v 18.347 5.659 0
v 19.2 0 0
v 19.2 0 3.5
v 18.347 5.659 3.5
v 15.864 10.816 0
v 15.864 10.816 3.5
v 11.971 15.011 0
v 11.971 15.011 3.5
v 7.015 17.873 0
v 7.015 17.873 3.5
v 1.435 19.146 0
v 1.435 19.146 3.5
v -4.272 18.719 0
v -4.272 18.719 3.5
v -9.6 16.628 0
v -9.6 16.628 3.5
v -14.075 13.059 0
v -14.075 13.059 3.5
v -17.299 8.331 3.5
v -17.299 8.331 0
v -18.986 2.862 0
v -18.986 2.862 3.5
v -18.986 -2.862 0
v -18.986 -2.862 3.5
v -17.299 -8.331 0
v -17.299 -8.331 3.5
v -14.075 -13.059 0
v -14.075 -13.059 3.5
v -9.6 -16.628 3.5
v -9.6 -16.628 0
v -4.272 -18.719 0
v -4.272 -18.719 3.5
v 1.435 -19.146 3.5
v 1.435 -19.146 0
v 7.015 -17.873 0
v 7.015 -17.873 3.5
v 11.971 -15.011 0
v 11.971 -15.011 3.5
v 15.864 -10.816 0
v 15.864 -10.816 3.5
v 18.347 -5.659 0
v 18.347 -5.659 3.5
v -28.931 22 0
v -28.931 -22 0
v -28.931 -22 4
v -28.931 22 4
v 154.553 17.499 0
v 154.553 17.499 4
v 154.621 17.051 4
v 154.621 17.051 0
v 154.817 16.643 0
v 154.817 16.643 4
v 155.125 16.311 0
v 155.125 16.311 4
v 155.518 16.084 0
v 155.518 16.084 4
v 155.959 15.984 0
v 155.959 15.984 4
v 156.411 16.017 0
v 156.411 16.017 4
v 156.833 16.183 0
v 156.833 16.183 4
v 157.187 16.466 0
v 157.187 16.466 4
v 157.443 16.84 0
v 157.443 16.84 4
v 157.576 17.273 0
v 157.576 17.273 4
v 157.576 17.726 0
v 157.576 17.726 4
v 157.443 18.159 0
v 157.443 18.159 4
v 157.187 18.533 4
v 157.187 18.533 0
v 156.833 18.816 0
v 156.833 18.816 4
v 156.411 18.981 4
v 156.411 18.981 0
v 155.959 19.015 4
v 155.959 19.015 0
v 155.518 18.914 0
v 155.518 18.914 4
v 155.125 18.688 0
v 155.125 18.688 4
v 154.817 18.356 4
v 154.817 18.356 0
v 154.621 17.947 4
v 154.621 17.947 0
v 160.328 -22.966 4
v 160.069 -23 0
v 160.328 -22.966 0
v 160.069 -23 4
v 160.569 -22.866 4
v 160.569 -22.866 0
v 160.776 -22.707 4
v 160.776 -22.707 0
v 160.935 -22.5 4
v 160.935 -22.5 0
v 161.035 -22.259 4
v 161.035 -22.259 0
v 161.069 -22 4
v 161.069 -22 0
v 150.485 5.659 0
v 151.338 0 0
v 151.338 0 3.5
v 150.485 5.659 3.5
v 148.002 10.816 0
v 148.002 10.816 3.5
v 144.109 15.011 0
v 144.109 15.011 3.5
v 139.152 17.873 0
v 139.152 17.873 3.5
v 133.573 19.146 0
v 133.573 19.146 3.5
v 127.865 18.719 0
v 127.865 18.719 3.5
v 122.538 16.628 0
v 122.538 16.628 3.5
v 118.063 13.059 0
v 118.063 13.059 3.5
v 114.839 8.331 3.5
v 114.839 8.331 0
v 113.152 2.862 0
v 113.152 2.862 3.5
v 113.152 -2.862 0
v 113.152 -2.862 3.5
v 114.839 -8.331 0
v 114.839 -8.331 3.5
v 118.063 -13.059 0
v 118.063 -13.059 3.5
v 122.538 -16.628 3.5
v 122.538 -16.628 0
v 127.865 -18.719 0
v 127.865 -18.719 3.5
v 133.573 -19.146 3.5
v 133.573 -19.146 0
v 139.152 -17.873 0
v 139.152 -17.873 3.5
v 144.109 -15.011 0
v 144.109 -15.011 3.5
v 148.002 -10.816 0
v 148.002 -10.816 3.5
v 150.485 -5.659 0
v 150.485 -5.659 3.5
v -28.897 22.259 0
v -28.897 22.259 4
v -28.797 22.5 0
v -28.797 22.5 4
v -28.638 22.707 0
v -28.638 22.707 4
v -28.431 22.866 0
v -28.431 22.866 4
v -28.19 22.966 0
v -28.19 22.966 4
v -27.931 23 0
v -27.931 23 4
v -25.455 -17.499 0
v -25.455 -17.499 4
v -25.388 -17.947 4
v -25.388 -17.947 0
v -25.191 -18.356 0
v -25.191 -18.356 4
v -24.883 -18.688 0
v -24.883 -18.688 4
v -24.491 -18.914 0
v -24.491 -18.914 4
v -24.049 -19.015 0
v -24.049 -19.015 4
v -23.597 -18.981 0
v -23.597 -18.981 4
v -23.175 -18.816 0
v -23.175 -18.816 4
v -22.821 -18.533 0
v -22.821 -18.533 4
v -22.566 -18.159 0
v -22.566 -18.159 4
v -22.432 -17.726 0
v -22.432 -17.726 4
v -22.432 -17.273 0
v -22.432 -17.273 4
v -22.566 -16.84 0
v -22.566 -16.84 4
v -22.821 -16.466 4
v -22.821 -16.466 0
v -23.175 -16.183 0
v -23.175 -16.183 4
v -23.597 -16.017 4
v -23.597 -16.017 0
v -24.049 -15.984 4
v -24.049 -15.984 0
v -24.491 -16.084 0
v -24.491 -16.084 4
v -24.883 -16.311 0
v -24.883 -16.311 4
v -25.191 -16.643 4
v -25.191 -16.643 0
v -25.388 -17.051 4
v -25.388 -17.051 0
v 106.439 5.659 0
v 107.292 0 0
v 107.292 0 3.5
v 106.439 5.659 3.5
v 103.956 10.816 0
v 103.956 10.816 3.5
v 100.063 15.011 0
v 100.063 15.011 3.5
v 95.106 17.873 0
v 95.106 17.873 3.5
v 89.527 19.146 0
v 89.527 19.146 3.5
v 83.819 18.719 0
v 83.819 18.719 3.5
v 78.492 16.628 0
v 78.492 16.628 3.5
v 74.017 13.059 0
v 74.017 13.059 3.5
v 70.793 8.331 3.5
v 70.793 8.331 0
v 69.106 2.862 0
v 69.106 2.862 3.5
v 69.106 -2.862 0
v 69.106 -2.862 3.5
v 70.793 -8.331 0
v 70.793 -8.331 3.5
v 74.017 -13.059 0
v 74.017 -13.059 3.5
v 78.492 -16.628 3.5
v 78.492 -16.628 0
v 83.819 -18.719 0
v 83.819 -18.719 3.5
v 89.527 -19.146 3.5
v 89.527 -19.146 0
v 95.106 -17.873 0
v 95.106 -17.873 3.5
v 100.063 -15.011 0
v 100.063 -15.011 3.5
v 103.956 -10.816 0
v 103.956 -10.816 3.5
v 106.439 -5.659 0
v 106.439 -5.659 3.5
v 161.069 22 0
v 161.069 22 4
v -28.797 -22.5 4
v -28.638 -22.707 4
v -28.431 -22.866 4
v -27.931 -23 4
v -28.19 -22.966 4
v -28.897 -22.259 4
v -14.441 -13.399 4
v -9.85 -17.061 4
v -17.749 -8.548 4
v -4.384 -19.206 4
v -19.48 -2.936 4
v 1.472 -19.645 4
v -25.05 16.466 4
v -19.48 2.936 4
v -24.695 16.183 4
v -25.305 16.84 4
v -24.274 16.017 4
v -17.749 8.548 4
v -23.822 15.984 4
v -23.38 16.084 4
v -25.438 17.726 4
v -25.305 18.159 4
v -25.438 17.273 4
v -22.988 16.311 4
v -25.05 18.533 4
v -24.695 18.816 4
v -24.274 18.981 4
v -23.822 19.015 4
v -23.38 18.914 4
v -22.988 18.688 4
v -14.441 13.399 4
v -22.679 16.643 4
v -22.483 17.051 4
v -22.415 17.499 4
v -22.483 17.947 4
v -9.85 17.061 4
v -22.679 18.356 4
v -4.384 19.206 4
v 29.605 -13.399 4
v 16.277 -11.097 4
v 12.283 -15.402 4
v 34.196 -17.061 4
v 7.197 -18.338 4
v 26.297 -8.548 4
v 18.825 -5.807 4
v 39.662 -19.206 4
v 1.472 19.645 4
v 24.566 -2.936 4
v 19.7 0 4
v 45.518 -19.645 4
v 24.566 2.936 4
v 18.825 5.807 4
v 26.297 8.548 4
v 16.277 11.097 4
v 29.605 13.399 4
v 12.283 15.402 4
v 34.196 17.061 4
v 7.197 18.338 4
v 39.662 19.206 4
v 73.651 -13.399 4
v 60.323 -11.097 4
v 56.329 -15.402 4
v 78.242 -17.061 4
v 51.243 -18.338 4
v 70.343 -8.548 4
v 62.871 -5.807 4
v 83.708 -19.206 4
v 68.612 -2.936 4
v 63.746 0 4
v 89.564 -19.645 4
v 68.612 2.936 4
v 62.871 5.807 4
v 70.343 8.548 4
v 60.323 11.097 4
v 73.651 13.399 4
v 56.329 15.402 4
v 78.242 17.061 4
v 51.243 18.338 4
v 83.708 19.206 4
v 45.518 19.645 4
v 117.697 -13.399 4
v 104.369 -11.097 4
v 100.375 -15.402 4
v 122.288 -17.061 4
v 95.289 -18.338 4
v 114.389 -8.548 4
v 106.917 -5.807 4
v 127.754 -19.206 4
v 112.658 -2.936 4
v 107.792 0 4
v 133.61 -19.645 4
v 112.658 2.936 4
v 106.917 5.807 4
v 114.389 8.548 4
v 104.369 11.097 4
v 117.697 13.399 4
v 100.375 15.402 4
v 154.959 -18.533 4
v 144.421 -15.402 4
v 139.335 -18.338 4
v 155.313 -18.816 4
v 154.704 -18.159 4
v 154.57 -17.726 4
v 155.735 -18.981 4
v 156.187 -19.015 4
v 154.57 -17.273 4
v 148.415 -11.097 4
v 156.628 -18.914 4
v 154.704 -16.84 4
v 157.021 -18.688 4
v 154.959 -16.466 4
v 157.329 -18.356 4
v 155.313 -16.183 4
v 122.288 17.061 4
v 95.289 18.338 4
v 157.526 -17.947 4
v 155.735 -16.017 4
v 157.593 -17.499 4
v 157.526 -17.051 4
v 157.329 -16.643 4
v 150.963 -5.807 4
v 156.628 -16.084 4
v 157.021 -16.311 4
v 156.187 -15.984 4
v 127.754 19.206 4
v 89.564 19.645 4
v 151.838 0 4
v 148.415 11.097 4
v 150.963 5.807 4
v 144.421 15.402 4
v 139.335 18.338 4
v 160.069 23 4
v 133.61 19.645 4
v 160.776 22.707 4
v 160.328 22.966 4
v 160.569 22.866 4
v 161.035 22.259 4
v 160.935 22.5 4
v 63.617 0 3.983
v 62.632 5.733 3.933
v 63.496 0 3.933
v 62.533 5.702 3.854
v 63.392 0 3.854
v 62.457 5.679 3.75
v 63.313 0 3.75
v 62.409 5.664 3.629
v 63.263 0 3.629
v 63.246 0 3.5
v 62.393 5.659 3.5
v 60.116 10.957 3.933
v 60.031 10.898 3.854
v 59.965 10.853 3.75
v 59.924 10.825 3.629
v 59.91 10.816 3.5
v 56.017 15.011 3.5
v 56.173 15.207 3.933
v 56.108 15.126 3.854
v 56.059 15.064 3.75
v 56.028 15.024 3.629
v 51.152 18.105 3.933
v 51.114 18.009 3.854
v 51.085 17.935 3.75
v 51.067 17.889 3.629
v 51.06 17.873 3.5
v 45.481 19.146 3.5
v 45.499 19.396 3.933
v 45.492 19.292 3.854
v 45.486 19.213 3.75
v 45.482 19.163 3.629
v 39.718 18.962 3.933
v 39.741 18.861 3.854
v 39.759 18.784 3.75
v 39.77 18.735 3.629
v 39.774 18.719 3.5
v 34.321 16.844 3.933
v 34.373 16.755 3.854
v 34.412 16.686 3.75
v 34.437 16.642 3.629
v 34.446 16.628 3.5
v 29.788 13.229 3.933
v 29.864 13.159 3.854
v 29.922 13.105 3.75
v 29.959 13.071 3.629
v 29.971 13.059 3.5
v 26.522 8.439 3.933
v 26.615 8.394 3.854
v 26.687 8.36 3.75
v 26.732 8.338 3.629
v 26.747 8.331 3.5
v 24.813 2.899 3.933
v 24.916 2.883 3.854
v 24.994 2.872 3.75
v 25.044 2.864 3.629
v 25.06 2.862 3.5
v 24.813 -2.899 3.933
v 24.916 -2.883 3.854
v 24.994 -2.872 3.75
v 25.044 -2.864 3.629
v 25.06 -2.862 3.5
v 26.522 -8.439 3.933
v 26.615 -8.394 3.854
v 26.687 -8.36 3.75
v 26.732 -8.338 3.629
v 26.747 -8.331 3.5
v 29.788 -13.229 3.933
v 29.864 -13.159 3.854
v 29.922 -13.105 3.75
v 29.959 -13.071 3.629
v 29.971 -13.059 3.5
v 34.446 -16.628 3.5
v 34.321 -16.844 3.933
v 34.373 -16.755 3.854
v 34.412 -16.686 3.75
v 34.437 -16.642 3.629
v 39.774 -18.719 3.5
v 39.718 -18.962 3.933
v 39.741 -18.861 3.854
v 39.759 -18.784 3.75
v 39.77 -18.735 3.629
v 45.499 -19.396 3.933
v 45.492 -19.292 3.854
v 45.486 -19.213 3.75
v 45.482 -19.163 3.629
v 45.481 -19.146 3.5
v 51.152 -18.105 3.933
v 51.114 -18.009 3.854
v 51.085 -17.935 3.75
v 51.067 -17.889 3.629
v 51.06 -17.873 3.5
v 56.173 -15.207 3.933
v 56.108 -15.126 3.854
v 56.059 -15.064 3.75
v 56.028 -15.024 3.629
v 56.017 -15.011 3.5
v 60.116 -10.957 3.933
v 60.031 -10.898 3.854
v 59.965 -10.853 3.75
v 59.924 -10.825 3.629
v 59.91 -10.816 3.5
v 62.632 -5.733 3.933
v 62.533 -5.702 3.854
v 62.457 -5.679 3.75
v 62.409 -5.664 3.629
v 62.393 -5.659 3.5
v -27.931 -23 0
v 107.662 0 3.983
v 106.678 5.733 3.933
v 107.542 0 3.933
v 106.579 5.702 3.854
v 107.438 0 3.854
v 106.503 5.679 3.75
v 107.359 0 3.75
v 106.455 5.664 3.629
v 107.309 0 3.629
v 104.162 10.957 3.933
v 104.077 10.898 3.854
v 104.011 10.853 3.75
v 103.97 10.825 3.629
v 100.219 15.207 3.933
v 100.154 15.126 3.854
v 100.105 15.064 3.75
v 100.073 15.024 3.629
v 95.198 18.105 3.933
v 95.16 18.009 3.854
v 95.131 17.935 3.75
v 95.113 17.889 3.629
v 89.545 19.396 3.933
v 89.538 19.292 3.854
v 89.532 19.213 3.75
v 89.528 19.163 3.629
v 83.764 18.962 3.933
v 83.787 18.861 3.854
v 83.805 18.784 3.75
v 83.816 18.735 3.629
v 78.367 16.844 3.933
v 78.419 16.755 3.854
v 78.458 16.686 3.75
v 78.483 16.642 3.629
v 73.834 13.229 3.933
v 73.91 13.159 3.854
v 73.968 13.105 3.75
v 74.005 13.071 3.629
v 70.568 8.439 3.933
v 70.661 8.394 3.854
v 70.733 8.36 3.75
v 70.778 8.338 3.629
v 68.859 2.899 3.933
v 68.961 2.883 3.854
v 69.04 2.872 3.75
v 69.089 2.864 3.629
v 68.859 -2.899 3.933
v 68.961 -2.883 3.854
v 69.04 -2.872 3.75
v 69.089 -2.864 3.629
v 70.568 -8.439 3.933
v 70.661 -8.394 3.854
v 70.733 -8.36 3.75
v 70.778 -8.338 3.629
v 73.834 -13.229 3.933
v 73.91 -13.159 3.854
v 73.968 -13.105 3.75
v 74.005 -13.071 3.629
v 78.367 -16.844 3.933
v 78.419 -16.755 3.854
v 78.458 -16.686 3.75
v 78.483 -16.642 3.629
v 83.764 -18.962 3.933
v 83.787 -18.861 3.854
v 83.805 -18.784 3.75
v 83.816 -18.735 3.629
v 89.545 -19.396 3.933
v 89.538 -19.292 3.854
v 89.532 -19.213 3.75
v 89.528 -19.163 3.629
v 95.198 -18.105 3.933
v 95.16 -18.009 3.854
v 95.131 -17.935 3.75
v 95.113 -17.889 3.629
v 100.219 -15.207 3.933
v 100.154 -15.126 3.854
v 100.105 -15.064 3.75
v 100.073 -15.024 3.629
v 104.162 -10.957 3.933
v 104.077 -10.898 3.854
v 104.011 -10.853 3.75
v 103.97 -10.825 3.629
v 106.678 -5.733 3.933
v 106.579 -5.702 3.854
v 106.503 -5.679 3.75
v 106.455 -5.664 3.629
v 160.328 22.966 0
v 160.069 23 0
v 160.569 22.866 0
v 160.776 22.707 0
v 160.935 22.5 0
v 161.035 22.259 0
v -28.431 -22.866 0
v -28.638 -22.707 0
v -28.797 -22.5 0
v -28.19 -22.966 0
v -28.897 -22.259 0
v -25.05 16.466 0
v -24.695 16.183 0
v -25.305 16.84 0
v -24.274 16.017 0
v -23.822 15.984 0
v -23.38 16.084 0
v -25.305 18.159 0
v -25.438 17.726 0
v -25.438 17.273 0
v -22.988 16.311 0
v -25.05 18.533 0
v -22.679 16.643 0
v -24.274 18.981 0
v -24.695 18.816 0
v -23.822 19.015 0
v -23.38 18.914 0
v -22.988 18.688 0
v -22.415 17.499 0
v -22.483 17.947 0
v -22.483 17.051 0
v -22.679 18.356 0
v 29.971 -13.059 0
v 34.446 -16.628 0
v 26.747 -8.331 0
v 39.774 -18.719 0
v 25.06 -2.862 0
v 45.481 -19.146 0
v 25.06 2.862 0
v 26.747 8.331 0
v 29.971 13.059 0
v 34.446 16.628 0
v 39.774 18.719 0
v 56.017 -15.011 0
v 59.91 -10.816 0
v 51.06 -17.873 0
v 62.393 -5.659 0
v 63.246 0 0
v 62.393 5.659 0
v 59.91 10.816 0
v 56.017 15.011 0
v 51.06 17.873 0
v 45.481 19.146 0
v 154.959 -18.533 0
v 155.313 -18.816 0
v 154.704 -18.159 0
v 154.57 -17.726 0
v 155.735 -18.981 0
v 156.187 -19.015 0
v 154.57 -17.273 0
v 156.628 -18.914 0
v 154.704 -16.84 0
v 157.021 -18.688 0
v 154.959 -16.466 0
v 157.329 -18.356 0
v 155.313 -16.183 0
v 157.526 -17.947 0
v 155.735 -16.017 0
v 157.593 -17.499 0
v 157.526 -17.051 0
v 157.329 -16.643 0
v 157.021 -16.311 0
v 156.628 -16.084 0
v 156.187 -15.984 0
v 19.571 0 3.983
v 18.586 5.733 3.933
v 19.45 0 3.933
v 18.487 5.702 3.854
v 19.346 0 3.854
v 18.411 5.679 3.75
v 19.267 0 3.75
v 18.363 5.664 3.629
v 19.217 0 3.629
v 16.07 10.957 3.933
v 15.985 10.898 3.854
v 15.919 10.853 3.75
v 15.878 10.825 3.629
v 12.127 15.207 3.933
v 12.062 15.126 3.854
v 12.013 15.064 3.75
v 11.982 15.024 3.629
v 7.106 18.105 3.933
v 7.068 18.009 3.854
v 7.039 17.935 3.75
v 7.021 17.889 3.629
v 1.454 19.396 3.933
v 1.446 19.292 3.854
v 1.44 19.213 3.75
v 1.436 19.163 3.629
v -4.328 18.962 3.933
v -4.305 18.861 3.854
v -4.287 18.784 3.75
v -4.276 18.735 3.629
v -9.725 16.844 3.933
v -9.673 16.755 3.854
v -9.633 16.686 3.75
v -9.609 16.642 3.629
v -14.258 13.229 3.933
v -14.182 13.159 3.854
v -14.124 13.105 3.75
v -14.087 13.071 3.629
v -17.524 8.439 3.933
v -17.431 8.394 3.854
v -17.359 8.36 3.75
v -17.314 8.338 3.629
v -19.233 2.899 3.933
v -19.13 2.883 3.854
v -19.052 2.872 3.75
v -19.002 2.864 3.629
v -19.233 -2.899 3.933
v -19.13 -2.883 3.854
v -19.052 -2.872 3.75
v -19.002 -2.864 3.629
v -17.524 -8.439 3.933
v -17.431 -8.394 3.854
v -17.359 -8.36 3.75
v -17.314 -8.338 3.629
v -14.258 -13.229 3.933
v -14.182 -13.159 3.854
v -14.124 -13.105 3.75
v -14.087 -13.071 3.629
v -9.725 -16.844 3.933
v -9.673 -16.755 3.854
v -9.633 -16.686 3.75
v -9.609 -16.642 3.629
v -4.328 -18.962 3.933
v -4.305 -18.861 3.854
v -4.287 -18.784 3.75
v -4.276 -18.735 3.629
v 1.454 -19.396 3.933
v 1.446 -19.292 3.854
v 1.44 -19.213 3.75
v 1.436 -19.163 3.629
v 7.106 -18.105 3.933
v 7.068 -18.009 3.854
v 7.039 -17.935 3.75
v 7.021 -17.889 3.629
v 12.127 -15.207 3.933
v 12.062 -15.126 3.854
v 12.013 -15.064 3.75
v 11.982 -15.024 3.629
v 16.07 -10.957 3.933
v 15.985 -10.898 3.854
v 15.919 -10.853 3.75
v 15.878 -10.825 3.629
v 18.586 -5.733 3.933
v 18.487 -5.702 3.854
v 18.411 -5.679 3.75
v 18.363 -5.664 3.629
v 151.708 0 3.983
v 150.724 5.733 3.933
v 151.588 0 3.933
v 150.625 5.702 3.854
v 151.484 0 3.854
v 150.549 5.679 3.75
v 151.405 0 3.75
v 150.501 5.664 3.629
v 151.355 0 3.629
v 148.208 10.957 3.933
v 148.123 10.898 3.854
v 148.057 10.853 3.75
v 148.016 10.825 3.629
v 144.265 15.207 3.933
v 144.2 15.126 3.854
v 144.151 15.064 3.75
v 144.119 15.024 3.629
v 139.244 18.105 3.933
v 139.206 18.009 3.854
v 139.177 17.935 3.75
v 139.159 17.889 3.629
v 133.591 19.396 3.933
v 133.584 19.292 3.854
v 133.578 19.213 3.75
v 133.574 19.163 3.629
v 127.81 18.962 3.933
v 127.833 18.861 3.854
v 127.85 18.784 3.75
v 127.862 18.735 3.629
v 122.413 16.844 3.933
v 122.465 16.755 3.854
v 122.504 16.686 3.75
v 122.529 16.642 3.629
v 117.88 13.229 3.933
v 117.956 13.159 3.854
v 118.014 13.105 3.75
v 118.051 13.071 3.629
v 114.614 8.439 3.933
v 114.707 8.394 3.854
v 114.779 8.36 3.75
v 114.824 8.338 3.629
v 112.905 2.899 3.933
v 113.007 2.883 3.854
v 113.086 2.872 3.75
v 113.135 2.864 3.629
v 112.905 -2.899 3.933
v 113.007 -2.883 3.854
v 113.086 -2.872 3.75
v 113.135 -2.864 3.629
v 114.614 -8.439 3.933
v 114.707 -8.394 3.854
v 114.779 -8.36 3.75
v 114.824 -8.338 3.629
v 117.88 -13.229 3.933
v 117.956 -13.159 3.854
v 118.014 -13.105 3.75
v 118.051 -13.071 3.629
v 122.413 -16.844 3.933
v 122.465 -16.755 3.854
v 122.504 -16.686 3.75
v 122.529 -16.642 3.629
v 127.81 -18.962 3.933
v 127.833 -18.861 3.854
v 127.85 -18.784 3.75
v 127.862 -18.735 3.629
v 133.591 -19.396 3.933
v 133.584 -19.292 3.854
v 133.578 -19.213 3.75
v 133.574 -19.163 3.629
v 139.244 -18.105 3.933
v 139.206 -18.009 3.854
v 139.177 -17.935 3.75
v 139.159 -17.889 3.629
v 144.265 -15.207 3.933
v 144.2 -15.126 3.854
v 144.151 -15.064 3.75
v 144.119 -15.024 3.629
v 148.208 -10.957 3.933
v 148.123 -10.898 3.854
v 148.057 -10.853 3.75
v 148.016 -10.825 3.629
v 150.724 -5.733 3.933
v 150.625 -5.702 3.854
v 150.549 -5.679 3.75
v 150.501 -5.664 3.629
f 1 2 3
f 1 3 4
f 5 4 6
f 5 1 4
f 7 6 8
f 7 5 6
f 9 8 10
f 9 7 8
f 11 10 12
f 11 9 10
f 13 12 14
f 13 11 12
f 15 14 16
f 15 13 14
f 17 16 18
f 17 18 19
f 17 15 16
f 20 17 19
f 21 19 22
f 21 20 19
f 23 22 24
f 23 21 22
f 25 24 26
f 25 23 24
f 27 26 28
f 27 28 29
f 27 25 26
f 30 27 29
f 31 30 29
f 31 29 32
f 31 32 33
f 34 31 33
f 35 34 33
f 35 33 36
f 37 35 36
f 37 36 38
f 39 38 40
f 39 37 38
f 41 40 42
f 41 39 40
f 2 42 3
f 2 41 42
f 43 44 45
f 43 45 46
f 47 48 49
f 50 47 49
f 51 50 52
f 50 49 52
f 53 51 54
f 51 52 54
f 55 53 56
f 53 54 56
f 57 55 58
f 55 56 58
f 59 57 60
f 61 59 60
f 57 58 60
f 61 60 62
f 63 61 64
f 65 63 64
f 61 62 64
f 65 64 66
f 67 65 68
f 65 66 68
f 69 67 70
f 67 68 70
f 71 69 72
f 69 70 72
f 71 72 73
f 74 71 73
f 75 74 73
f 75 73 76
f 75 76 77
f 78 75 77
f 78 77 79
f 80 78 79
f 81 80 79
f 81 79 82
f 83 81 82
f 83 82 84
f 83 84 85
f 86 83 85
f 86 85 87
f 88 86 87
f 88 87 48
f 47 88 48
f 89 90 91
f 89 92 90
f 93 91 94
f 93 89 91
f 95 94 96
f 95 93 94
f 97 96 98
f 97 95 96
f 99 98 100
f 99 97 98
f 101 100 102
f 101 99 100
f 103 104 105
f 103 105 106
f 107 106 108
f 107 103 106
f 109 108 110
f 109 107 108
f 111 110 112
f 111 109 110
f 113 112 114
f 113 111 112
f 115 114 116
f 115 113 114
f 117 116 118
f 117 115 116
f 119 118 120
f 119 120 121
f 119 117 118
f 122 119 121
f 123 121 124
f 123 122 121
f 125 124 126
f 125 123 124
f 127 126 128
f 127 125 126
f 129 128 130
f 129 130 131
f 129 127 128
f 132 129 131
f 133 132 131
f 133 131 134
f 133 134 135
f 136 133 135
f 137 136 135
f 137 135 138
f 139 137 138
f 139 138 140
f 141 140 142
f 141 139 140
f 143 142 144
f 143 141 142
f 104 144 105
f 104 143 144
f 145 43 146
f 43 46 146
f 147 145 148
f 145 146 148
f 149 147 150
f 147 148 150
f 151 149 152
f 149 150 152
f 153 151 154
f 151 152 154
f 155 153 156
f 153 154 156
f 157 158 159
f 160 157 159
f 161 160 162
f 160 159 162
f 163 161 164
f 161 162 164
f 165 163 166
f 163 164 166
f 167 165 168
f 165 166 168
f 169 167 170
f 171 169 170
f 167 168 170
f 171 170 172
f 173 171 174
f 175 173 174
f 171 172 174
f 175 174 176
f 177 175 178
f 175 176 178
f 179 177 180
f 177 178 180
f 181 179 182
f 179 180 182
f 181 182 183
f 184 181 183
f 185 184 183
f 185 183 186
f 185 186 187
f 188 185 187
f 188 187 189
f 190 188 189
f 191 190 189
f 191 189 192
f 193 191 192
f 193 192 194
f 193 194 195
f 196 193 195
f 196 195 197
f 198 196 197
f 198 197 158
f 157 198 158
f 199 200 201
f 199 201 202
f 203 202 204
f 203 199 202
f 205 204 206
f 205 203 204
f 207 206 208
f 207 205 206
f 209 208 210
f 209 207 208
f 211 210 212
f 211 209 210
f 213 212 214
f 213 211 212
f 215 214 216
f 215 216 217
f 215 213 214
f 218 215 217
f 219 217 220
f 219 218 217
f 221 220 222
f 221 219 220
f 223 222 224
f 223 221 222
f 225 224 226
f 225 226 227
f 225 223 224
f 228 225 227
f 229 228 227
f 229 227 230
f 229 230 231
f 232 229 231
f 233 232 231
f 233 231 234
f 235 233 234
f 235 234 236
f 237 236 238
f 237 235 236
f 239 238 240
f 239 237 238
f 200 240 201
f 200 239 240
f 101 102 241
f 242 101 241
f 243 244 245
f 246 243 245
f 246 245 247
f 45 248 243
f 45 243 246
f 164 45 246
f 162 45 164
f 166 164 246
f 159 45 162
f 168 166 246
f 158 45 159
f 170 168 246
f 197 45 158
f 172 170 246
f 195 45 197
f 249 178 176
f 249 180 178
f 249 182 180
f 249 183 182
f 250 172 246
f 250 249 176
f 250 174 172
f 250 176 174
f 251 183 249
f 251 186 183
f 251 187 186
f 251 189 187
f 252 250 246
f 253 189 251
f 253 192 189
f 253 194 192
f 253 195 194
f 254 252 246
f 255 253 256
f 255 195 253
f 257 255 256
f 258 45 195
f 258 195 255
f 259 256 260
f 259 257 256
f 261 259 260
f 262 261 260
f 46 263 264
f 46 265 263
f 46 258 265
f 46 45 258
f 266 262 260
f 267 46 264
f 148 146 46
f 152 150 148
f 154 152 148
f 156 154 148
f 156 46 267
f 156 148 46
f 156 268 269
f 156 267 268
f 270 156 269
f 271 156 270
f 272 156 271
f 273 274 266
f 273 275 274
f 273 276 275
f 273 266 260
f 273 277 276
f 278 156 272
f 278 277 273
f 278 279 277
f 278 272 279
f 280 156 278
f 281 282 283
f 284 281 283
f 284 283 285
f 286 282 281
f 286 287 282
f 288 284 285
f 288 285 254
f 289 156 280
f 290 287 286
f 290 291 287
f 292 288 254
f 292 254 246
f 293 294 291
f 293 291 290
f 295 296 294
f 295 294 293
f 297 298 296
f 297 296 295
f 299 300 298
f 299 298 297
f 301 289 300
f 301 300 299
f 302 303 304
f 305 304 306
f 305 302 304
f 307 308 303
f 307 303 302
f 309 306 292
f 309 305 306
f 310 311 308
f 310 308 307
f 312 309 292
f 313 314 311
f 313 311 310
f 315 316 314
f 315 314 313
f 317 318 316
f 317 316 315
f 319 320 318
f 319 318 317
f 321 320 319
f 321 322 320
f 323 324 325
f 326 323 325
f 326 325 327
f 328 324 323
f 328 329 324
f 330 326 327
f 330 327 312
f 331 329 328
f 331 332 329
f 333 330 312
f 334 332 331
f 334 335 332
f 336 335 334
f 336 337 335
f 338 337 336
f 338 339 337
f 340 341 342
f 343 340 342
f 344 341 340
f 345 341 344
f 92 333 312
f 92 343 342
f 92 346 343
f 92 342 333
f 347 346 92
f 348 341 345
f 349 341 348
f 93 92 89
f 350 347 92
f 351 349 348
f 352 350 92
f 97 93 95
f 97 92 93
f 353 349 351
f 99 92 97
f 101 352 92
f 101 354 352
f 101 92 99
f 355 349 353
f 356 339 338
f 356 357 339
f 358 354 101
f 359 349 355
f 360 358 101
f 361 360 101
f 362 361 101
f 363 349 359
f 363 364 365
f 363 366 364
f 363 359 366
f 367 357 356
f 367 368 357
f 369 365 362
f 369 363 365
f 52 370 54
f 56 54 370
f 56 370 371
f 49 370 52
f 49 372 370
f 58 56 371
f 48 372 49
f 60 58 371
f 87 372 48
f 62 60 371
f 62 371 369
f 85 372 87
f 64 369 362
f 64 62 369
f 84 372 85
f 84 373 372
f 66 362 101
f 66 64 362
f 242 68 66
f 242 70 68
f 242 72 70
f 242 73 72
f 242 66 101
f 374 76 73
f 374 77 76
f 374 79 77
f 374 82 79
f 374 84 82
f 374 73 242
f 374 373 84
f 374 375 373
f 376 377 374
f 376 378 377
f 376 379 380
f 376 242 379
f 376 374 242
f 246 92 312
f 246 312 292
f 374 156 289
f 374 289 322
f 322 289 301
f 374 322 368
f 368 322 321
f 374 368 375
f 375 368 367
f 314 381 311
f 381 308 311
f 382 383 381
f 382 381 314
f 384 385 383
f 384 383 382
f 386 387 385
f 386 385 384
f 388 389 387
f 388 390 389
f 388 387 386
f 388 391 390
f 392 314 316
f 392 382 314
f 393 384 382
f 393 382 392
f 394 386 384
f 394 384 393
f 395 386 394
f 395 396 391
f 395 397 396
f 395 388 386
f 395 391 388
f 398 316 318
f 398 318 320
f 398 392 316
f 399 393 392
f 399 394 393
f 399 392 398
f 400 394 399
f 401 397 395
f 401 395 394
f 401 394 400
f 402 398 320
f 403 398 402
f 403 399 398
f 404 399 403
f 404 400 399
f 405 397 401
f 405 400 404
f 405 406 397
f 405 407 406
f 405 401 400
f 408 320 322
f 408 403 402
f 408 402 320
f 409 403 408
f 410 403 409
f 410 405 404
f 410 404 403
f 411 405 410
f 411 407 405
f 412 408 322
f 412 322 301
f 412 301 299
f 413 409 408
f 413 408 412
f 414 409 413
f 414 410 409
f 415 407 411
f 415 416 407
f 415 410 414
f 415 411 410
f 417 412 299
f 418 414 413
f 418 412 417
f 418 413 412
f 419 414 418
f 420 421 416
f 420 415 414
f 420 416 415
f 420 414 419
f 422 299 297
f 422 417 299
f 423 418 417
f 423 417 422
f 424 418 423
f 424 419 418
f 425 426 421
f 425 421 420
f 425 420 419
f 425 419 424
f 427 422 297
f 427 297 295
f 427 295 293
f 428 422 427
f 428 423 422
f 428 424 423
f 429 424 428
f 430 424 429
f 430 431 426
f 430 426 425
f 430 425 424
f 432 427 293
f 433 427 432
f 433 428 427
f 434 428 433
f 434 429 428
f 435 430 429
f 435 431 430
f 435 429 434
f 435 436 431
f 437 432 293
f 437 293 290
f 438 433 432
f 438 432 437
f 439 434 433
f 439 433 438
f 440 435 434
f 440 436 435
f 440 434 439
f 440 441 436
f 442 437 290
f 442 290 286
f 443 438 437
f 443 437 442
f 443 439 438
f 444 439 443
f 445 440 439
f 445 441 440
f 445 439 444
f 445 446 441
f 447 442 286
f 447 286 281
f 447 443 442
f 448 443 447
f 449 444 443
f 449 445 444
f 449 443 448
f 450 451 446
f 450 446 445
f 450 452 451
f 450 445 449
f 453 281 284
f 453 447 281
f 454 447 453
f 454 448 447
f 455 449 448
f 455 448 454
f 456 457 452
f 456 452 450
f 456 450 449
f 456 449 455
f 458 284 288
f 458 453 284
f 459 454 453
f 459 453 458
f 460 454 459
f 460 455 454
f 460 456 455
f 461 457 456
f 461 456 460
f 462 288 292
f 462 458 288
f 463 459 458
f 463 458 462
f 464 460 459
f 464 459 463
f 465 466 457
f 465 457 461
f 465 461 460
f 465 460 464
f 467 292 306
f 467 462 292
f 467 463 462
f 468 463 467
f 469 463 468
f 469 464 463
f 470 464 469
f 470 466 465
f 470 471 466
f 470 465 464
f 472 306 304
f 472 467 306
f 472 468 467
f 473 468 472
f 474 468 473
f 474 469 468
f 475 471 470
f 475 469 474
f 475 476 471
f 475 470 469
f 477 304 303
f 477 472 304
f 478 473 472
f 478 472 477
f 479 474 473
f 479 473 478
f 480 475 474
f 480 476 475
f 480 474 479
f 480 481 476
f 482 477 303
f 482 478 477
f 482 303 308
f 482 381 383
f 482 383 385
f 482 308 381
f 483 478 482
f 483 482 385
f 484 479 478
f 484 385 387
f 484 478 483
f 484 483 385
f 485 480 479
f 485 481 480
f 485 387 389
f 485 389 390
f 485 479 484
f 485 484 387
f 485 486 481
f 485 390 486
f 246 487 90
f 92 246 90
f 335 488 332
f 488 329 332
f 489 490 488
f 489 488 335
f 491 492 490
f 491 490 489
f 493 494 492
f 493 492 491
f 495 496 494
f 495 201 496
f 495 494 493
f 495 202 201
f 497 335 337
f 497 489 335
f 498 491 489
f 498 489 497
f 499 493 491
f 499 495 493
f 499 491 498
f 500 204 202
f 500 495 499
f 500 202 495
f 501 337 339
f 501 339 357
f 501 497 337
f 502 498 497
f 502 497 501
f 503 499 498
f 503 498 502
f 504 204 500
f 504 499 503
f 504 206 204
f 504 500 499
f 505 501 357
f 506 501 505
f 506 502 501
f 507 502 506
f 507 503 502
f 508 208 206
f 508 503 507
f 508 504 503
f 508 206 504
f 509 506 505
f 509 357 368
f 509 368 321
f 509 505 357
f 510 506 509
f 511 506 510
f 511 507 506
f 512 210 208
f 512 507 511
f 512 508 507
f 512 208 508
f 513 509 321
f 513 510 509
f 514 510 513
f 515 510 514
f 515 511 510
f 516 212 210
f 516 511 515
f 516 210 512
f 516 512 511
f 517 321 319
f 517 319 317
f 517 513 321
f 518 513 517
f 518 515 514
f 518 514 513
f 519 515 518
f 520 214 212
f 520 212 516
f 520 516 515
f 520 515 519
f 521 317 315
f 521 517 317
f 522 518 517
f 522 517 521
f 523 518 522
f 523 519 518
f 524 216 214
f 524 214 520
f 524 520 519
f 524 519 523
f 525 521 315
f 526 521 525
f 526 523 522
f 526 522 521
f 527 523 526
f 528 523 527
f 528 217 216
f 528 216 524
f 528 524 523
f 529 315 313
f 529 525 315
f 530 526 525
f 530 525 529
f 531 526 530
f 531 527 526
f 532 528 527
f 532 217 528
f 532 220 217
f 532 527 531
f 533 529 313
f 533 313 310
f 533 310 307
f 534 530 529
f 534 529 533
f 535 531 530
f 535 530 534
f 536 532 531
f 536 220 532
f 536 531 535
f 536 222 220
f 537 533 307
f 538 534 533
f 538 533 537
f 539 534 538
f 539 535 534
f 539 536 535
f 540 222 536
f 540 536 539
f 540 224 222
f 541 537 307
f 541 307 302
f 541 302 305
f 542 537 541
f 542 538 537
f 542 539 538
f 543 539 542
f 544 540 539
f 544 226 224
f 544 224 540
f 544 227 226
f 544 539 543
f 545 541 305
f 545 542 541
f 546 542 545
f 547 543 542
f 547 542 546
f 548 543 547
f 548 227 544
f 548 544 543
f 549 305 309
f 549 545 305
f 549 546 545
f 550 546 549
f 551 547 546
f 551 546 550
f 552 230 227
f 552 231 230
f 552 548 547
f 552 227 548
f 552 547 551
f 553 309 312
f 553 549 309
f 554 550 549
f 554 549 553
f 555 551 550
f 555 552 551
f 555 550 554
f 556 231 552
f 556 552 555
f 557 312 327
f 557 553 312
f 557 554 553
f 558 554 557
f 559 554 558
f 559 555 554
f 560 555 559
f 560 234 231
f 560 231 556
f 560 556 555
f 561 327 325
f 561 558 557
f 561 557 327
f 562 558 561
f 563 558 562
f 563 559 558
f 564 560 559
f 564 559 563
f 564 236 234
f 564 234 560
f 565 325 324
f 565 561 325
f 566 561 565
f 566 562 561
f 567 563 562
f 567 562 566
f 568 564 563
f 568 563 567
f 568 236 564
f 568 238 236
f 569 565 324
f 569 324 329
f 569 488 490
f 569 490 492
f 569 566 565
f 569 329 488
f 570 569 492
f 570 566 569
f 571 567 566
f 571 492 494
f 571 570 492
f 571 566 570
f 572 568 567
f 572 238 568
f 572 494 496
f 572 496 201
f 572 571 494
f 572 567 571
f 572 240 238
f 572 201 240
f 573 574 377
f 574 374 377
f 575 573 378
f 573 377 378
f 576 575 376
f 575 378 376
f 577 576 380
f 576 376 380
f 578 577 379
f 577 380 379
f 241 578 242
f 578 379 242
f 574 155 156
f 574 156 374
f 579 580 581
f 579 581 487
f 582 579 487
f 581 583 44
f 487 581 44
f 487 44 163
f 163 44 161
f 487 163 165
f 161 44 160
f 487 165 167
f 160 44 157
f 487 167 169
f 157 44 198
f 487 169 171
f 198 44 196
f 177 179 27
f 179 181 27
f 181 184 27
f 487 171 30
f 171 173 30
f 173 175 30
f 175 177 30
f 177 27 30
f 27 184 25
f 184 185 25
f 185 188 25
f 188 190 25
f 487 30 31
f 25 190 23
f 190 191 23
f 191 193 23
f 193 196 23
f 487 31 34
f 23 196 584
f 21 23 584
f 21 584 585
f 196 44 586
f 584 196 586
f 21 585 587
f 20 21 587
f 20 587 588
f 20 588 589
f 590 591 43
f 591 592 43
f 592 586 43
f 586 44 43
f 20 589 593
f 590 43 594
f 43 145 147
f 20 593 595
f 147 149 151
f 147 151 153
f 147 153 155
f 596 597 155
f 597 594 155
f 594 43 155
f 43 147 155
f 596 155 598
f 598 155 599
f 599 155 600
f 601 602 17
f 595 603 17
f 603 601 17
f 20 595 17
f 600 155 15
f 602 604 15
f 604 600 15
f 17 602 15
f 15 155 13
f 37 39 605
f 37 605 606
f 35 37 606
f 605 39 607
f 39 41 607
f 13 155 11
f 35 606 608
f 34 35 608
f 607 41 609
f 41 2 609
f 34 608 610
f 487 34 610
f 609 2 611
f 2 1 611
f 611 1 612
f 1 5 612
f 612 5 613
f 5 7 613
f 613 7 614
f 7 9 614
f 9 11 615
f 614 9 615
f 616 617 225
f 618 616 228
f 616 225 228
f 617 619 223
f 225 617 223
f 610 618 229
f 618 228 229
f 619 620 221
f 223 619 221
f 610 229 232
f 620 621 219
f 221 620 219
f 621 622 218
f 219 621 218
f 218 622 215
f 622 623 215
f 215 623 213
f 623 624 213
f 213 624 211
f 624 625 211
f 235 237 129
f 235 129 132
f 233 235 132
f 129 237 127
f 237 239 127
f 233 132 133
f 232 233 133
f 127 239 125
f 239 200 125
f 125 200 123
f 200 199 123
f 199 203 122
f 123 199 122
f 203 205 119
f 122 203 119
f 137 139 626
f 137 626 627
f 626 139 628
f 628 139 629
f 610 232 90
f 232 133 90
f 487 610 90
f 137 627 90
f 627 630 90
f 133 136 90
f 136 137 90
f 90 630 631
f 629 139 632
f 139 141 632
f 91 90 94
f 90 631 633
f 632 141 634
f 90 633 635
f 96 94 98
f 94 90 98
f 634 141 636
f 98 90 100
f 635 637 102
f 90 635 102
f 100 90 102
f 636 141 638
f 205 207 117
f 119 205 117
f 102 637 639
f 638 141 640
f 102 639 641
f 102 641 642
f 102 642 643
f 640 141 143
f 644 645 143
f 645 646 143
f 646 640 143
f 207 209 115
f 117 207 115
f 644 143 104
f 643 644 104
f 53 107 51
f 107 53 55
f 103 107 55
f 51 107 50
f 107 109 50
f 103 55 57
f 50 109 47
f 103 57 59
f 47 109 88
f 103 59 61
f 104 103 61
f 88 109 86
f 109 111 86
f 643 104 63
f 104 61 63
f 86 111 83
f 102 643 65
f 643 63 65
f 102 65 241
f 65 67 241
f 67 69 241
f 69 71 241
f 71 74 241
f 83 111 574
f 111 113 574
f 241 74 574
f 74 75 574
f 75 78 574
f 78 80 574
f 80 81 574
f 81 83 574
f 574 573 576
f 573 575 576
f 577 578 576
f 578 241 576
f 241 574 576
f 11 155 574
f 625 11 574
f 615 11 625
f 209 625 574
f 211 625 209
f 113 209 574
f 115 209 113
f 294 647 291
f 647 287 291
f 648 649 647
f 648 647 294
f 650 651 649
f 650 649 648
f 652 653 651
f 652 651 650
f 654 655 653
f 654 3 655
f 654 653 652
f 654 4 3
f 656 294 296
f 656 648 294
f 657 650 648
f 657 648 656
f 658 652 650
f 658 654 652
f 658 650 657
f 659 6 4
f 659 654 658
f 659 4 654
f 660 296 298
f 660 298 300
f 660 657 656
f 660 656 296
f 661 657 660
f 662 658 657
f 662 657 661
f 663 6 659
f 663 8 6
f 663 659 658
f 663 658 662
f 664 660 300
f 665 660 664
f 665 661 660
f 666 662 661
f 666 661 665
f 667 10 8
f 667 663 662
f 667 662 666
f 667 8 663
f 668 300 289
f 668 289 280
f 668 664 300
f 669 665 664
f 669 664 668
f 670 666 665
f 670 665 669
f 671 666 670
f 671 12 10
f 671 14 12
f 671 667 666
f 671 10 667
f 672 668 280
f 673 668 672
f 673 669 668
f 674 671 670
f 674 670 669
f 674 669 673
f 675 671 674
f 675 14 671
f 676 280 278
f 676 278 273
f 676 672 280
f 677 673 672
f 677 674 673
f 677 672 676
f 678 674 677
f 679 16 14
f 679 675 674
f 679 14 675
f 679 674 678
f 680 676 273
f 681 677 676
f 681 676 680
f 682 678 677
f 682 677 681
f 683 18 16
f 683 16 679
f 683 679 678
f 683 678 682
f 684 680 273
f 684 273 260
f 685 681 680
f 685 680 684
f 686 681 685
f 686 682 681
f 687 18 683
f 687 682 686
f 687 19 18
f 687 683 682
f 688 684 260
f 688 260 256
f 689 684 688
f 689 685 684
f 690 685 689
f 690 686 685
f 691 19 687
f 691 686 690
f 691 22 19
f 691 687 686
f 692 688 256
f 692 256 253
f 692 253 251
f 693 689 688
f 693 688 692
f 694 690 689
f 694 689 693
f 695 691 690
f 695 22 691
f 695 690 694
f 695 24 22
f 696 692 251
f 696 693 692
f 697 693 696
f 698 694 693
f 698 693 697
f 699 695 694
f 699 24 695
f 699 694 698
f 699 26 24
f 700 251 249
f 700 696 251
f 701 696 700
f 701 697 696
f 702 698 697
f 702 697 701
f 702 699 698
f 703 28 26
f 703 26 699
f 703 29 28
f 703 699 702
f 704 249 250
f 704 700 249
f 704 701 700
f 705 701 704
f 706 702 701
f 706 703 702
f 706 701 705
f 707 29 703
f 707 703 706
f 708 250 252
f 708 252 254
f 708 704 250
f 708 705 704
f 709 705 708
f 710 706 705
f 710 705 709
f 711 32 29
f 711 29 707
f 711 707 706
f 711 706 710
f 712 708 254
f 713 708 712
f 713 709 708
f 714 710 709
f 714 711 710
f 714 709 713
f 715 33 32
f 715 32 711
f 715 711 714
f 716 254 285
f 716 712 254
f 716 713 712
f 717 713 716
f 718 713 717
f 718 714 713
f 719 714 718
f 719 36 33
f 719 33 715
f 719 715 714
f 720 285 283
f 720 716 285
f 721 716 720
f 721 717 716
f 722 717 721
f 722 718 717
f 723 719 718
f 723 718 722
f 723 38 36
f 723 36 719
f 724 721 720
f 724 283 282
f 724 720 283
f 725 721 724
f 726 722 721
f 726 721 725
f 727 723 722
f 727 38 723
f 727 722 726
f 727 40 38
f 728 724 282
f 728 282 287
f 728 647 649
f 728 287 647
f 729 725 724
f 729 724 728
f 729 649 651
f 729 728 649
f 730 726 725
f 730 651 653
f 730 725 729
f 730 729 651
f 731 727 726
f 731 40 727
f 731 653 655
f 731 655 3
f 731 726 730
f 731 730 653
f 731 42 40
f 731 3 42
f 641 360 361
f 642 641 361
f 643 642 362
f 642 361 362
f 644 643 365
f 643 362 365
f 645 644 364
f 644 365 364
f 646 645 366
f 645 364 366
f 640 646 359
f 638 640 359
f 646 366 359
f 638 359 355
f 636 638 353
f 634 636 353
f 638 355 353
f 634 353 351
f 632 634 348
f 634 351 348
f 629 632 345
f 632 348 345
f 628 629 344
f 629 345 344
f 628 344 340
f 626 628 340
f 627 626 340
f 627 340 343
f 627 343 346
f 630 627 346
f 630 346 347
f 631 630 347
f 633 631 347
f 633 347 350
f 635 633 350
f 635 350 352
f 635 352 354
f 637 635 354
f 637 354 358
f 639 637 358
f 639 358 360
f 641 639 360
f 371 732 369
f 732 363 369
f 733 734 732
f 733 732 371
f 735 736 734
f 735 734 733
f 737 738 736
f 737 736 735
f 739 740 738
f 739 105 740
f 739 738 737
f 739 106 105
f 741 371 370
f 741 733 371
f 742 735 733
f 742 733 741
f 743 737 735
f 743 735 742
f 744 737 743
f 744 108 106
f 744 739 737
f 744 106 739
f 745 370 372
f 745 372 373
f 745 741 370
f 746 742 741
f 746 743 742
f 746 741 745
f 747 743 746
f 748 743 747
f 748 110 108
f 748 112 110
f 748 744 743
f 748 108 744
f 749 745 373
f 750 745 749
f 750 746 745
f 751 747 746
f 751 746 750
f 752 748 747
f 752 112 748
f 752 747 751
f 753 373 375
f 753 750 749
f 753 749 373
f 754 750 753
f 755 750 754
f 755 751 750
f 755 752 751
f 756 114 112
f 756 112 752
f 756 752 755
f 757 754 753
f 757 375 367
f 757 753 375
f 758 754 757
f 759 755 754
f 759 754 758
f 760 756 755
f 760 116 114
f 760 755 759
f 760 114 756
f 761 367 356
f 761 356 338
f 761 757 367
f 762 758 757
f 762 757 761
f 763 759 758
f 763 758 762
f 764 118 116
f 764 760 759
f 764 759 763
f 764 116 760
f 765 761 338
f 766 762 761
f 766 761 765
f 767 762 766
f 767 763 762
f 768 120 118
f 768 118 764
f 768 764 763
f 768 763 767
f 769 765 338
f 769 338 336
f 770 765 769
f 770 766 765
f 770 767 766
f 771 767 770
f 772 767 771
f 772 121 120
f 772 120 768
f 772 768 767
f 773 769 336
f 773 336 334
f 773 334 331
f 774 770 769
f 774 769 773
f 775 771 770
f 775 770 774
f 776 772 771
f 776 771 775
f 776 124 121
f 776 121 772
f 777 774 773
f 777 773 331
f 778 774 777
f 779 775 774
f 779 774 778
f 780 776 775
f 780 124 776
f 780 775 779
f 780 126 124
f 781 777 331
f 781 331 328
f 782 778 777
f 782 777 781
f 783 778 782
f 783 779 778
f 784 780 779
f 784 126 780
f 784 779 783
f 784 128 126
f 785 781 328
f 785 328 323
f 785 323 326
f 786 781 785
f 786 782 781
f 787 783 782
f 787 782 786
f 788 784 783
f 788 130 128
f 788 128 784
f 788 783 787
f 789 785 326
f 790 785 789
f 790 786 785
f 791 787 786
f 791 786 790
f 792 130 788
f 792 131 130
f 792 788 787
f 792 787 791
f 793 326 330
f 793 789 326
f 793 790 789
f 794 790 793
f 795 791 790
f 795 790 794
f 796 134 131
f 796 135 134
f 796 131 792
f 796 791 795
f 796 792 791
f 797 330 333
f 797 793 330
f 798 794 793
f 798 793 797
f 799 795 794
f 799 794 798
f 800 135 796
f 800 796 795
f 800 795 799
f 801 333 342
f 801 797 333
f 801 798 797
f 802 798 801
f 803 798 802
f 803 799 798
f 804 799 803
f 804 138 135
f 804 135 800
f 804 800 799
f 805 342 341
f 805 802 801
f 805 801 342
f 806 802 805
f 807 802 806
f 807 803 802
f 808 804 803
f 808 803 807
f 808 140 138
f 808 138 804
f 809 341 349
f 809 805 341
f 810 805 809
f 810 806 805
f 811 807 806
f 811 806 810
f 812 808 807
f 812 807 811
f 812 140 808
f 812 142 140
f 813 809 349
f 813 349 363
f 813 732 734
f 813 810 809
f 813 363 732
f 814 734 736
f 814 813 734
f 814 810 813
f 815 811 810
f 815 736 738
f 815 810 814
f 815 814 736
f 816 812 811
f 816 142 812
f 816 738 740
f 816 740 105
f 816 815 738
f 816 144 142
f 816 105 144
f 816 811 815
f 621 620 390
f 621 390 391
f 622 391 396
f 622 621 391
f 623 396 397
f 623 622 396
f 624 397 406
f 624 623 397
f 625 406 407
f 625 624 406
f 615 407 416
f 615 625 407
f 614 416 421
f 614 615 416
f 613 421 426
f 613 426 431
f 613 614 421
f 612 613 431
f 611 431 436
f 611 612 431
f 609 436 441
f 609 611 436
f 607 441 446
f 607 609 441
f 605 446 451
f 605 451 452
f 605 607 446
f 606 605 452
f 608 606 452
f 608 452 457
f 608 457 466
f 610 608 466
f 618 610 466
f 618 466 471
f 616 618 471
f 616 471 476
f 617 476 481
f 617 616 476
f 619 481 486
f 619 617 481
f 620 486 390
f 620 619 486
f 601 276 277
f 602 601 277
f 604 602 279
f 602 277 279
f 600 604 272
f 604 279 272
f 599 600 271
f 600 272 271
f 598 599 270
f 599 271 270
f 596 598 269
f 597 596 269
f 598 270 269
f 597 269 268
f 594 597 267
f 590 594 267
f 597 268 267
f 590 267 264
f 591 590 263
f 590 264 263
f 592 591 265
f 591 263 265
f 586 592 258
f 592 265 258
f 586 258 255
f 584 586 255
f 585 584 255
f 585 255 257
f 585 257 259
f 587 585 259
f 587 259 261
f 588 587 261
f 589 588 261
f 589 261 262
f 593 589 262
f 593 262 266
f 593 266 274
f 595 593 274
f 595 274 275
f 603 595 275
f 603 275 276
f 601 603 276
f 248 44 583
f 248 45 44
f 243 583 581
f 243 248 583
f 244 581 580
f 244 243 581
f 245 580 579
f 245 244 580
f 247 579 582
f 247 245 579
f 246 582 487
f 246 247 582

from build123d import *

# Parameters (mm, degrees)
ESQUISSE1_W             = 190
ESQUISSE1_H             = 46
ESQUISSE1_R             = 19.2
BOSS_EXTRU_1_DEPTH      = 4
ESQUISSE2_R             = 1.52
ENL_V_MAT_EXTRU_1_DEPTH = 5
CONG_2_R                = 1
CONG_3_R                = 0.5


with BuildPart() as part:
    # Esquisse1 → Boss.-Extru.1 (new body)
    with BuildSketch(Plane.XY):
        with Locations((66.068886156, 0)):
            Rectangle(ESQUISSE1_W, ESQUISSE1_H)
        Circle(ESQUISSE1_R, mode=Mode.SUBTRACT)
        with Locations((44.045924104, 0)):
            Circle(ESQUISSE1_R, mode=Mode.SUBTRACT)
        with Locations((88.091848208, 0)):
            Circle(ESQUISSE1_R, mode=Mode.SUBTRACT)
        with Locations((132.137772312, 0)):
            Circle(ESQUISSE1_R, mode=Mode.SUBTRACT)
    extrude(amount=BOSS_EXTRU_1_DEPTH)

    # Esquisse2 → Enlèv. mat.-Extru.1 (cut)
    with BuildSketch(Plane.XY.offset(4)):
        with Locations((-23.935283884, 17.499369506)):
            Circle(ESQUISSE2_R)
        with Locations(Location((-23.935283884, -17.499369506, 0), (0, 0, 180))):
            Circle(ESQUISSE2_R)
        with Locations((156.073056196, -17.499369506)):
            Circle(ESQUISSE2_R)
        with Locations(Location((156.073056196, 17.499369506, 0), (0, 0, 180))):
            Circle(ESQUISSE2_R)
    extrude(amount=-ENL_V_MAT_EXTRU_1_DEPTH, mode=Mode.SUBTRACT)

    # Congé2
    cong_2_edges = [part.edges().sort_by_distance(p)[0] for p in [
        (161.068886156, -23, 2),
        (-28.931113844, -23, 2),
        (-28.931113844, 23, 2),
        (161.068886156, 23, 2),
    ]]
    fillet(cong_2_edges, radius=CONG_2_R)

    # Congé3
    cong_3_edges = [part.edges().sort_by_distance(p)[0] for p in [
        (-19.2, 0, 4),
        (24.845924104, 0, 4),
        (68.891848208, 0, 4),
        (112.937772312, 0, 4),
    ]]
    fillet(cong_3_edges, radius=CONG_3_R)


solid = part.part
